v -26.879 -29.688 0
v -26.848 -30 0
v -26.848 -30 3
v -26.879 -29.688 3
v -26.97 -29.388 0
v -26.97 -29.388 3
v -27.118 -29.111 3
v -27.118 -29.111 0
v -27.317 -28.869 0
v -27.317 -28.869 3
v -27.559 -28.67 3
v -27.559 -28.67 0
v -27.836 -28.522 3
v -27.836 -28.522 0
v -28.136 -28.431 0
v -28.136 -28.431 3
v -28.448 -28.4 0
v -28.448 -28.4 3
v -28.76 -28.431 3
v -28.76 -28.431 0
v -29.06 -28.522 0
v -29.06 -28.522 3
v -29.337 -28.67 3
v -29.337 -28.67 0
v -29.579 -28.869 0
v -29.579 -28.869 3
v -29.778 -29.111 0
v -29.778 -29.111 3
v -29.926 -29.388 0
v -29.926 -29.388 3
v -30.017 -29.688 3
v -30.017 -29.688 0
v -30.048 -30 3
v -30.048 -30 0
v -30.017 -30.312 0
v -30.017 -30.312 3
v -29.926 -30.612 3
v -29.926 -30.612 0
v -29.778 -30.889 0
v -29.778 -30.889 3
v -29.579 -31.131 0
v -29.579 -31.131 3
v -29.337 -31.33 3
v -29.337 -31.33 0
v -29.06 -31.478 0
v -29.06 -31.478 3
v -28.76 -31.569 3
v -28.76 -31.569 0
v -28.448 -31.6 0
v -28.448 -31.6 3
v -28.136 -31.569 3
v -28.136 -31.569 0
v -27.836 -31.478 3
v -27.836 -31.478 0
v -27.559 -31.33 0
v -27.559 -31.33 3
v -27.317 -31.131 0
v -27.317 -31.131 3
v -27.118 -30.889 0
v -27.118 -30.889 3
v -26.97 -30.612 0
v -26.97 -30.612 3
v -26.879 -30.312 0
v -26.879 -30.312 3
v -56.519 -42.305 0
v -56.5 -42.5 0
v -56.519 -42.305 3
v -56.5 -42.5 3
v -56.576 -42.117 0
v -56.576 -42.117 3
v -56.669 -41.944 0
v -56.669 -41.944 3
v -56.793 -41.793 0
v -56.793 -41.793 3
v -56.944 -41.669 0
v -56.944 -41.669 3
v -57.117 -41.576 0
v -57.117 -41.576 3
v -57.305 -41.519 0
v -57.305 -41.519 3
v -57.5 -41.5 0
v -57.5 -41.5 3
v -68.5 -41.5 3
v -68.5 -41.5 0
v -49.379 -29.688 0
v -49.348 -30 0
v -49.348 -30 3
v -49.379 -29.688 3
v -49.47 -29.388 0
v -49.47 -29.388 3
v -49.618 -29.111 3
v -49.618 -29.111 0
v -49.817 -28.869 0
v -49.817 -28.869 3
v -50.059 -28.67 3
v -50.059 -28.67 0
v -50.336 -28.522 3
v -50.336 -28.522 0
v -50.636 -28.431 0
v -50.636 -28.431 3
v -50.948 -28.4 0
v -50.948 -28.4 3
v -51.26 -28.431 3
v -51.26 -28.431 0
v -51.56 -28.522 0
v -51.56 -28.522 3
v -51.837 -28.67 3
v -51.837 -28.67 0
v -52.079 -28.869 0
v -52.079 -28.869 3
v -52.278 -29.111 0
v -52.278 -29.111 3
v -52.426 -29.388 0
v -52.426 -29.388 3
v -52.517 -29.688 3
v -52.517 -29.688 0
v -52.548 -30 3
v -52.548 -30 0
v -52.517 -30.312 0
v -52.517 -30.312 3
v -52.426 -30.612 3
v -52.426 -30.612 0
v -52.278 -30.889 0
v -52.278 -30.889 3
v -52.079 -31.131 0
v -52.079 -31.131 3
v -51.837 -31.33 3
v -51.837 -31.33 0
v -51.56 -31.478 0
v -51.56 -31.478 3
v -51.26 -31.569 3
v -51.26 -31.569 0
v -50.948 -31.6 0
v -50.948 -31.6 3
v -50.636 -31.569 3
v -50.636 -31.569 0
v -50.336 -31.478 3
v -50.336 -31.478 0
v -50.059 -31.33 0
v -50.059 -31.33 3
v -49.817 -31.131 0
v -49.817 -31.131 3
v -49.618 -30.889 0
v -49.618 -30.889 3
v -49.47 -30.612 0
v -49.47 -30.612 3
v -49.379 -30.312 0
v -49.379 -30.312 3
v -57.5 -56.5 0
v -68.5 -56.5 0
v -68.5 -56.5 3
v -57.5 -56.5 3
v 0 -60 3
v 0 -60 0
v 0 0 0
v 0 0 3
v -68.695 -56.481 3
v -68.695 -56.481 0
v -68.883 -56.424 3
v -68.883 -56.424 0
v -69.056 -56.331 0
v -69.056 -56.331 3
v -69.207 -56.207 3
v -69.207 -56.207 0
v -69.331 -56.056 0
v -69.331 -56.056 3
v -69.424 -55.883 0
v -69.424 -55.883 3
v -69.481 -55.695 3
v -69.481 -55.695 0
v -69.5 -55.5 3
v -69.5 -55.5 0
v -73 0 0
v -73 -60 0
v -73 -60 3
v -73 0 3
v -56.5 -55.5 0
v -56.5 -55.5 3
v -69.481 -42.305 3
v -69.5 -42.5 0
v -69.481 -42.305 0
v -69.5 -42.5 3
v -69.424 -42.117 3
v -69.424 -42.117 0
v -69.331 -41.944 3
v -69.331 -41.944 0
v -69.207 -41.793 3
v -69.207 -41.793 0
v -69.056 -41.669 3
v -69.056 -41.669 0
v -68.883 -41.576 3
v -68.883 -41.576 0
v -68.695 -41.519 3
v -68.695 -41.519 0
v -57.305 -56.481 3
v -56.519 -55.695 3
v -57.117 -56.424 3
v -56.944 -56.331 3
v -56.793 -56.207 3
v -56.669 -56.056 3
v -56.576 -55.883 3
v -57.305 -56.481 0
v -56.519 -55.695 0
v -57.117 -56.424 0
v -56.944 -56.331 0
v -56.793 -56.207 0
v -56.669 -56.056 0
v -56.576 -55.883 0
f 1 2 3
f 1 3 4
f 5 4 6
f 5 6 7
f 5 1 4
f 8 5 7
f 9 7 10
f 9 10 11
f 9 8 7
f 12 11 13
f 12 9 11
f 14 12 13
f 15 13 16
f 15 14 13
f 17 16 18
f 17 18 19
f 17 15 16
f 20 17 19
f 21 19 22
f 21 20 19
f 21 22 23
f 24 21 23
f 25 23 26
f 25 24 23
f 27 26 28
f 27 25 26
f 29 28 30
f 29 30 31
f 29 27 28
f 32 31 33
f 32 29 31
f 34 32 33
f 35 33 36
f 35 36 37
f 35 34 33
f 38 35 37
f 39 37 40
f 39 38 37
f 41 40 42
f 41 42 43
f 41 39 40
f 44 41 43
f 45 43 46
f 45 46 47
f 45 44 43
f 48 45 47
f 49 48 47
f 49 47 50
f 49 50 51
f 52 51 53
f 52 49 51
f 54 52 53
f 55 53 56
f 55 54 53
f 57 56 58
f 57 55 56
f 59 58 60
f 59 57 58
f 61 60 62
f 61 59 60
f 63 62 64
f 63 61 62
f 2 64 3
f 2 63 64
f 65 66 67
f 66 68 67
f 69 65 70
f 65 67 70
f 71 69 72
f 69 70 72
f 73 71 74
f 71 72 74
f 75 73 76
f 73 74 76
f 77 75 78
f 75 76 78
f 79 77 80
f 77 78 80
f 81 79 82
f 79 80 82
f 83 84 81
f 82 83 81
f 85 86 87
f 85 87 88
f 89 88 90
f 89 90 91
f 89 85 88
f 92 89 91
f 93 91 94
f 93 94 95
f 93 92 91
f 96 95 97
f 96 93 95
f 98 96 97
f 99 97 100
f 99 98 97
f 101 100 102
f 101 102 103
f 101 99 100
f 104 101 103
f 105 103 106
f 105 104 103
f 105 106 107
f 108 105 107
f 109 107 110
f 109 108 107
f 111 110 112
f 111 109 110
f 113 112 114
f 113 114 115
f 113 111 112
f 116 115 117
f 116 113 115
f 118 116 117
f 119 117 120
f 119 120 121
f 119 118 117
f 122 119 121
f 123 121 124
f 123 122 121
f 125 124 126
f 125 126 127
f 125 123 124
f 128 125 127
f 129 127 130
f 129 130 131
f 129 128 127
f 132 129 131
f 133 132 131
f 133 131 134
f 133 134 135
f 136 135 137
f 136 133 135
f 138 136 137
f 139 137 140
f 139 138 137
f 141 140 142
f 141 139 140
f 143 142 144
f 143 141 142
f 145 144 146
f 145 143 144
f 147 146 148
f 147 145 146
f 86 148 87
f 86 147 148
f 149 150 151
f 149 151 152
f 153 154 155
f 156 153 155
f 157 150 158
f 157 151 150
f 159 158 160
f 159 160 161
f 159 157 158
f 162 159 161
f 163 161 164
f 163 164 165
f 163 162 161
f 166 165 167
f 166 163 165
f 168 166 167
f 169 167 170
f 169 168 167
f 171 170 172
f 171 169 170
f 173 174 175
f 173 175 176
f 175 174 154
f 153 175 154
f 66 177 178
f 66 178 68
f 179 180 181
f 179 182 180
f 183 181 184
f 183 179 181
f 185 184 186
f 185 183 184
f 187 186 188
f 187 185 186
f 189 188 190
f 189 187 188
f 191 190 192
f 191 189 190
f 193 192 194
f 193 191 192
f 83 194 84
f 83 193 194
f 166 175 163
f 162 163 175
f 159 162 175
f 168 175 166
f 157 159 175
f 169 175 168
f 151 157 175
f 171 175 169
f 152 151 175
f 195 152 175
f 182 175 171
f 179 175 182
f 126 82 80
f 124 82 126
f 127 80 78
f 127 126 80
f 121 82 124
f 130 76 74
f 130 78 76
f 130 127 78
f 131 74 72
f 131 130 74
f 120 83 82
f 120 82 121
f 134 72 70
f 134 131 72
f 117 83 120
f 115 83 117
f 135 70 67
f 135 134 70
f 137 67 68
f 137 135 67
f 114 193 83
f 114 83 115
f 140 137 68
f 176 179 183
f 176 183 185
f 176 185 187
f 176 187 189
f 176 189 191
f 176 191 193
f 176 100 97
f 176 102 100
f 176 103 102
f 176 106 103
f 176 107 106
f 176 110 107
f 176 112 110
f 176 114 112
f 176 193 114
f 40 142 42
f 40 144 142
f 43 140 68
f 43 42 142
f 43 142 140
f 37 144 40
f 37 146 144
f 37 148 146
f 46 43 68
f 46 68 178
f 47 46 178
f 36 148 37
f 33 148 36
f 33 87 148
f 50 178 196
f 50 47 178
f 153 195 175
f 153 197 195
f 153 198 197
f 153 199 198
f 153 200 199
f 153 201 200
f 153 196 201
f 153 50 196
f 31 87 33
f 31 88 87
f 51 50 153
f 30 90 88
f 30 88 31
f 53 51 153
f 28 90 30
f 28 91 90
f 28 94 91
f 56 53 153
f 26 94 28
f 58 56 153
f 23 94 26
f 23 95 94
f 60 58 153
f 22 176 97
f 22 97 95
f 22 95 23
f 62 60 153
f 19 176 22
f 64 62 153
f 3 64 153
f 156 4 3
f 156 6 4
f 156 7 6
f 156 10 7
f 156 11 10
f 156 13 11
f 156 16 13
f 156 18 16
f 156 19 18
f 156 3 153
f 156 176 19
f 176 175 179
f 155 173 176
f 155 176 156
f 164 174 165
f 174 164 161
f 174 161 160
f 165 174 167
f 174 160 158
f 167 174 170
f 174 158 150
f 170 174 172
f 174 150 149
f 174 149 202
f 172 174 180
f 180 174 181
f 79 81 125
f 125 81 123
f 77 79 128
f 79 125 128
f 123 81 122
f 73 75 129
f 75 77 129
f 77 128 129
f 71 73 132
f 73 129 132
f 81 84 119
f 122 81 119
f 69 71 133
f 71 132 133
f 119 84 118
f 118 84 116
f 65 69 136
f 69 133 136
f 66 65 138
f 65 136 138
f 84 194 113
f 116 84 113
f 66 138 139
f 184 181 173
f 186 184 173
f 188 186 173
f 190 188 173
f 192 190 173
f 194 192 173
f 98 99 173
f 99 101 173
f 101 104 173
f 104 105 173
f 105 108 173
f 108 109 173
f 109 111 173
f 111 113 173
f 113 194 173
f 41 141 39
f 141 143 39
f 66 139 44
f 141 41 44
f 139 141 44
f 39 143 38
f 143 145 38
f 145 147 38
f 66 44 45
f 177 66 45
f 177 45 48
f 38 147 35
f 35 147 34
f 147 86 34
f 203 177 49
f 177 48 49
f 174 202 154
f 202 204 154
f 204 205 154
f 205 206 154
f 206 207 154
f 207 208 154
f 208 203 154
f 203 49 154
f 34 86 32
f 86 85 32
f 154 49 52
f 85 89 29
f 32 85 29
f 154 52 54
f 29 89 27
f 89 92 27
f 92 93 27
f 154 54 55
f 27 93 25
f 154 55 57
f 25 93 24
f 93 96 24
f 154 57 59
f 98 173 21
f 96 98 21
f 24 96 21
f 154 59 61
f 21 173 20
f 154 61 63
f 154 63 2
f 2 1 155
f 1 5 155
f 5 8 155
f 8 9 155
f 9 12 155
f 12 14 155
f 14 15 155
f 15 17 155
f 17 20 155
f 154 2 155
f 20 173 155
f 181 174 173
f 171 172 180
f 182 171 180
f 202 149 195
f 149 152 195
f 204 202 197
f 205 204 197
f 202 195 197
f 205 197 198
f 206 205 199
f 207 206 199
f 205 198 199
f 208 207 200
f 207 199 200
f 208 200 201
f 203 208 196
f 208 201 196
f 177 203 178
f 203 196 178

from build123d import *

# Parameters (mm, degrees)
F0_W     = 73
F0_H     = 60
F0_W_2   = 13
F0_H_2   = 15
F0_R     = 1.6
F1_DEPTH = 3
F2_R     = 1


with BuildPart() as f1:
    # F0 (on Top) → F1 (new body)
    with BuildSketch(Plane.XY):
        with Locations((-36.5, -30)):
            Rectangle(F0_W, F0_H)
        with Locations((-63, -49)):
            Rectangle(F0_W_2, F0_H_2, mode=Mode.SUBTRACT)
        with Locations((-50.948029, -30)):
            Circle(F0_R, mode=Mode.SUBTRACT)
        with Locations((-28.448029, -30)):
            Circle(F0_R, mode=Mode.SUBTRACT)
    extrude(amount=F1_DEPTH)

    # F2
    f2_edges = [f1.edges().sort_by_distance(p)[0] for p in [
        (-69.5, -41.5, 1.5),
        (-56.5, -56.5, 1.5),
        (-69.5, -56.5, 1.5),
        (-56.5, -41.5, 1.5),
    ]]
    fillet(f2_edges, radius=F2_R)


solid = f1.part
